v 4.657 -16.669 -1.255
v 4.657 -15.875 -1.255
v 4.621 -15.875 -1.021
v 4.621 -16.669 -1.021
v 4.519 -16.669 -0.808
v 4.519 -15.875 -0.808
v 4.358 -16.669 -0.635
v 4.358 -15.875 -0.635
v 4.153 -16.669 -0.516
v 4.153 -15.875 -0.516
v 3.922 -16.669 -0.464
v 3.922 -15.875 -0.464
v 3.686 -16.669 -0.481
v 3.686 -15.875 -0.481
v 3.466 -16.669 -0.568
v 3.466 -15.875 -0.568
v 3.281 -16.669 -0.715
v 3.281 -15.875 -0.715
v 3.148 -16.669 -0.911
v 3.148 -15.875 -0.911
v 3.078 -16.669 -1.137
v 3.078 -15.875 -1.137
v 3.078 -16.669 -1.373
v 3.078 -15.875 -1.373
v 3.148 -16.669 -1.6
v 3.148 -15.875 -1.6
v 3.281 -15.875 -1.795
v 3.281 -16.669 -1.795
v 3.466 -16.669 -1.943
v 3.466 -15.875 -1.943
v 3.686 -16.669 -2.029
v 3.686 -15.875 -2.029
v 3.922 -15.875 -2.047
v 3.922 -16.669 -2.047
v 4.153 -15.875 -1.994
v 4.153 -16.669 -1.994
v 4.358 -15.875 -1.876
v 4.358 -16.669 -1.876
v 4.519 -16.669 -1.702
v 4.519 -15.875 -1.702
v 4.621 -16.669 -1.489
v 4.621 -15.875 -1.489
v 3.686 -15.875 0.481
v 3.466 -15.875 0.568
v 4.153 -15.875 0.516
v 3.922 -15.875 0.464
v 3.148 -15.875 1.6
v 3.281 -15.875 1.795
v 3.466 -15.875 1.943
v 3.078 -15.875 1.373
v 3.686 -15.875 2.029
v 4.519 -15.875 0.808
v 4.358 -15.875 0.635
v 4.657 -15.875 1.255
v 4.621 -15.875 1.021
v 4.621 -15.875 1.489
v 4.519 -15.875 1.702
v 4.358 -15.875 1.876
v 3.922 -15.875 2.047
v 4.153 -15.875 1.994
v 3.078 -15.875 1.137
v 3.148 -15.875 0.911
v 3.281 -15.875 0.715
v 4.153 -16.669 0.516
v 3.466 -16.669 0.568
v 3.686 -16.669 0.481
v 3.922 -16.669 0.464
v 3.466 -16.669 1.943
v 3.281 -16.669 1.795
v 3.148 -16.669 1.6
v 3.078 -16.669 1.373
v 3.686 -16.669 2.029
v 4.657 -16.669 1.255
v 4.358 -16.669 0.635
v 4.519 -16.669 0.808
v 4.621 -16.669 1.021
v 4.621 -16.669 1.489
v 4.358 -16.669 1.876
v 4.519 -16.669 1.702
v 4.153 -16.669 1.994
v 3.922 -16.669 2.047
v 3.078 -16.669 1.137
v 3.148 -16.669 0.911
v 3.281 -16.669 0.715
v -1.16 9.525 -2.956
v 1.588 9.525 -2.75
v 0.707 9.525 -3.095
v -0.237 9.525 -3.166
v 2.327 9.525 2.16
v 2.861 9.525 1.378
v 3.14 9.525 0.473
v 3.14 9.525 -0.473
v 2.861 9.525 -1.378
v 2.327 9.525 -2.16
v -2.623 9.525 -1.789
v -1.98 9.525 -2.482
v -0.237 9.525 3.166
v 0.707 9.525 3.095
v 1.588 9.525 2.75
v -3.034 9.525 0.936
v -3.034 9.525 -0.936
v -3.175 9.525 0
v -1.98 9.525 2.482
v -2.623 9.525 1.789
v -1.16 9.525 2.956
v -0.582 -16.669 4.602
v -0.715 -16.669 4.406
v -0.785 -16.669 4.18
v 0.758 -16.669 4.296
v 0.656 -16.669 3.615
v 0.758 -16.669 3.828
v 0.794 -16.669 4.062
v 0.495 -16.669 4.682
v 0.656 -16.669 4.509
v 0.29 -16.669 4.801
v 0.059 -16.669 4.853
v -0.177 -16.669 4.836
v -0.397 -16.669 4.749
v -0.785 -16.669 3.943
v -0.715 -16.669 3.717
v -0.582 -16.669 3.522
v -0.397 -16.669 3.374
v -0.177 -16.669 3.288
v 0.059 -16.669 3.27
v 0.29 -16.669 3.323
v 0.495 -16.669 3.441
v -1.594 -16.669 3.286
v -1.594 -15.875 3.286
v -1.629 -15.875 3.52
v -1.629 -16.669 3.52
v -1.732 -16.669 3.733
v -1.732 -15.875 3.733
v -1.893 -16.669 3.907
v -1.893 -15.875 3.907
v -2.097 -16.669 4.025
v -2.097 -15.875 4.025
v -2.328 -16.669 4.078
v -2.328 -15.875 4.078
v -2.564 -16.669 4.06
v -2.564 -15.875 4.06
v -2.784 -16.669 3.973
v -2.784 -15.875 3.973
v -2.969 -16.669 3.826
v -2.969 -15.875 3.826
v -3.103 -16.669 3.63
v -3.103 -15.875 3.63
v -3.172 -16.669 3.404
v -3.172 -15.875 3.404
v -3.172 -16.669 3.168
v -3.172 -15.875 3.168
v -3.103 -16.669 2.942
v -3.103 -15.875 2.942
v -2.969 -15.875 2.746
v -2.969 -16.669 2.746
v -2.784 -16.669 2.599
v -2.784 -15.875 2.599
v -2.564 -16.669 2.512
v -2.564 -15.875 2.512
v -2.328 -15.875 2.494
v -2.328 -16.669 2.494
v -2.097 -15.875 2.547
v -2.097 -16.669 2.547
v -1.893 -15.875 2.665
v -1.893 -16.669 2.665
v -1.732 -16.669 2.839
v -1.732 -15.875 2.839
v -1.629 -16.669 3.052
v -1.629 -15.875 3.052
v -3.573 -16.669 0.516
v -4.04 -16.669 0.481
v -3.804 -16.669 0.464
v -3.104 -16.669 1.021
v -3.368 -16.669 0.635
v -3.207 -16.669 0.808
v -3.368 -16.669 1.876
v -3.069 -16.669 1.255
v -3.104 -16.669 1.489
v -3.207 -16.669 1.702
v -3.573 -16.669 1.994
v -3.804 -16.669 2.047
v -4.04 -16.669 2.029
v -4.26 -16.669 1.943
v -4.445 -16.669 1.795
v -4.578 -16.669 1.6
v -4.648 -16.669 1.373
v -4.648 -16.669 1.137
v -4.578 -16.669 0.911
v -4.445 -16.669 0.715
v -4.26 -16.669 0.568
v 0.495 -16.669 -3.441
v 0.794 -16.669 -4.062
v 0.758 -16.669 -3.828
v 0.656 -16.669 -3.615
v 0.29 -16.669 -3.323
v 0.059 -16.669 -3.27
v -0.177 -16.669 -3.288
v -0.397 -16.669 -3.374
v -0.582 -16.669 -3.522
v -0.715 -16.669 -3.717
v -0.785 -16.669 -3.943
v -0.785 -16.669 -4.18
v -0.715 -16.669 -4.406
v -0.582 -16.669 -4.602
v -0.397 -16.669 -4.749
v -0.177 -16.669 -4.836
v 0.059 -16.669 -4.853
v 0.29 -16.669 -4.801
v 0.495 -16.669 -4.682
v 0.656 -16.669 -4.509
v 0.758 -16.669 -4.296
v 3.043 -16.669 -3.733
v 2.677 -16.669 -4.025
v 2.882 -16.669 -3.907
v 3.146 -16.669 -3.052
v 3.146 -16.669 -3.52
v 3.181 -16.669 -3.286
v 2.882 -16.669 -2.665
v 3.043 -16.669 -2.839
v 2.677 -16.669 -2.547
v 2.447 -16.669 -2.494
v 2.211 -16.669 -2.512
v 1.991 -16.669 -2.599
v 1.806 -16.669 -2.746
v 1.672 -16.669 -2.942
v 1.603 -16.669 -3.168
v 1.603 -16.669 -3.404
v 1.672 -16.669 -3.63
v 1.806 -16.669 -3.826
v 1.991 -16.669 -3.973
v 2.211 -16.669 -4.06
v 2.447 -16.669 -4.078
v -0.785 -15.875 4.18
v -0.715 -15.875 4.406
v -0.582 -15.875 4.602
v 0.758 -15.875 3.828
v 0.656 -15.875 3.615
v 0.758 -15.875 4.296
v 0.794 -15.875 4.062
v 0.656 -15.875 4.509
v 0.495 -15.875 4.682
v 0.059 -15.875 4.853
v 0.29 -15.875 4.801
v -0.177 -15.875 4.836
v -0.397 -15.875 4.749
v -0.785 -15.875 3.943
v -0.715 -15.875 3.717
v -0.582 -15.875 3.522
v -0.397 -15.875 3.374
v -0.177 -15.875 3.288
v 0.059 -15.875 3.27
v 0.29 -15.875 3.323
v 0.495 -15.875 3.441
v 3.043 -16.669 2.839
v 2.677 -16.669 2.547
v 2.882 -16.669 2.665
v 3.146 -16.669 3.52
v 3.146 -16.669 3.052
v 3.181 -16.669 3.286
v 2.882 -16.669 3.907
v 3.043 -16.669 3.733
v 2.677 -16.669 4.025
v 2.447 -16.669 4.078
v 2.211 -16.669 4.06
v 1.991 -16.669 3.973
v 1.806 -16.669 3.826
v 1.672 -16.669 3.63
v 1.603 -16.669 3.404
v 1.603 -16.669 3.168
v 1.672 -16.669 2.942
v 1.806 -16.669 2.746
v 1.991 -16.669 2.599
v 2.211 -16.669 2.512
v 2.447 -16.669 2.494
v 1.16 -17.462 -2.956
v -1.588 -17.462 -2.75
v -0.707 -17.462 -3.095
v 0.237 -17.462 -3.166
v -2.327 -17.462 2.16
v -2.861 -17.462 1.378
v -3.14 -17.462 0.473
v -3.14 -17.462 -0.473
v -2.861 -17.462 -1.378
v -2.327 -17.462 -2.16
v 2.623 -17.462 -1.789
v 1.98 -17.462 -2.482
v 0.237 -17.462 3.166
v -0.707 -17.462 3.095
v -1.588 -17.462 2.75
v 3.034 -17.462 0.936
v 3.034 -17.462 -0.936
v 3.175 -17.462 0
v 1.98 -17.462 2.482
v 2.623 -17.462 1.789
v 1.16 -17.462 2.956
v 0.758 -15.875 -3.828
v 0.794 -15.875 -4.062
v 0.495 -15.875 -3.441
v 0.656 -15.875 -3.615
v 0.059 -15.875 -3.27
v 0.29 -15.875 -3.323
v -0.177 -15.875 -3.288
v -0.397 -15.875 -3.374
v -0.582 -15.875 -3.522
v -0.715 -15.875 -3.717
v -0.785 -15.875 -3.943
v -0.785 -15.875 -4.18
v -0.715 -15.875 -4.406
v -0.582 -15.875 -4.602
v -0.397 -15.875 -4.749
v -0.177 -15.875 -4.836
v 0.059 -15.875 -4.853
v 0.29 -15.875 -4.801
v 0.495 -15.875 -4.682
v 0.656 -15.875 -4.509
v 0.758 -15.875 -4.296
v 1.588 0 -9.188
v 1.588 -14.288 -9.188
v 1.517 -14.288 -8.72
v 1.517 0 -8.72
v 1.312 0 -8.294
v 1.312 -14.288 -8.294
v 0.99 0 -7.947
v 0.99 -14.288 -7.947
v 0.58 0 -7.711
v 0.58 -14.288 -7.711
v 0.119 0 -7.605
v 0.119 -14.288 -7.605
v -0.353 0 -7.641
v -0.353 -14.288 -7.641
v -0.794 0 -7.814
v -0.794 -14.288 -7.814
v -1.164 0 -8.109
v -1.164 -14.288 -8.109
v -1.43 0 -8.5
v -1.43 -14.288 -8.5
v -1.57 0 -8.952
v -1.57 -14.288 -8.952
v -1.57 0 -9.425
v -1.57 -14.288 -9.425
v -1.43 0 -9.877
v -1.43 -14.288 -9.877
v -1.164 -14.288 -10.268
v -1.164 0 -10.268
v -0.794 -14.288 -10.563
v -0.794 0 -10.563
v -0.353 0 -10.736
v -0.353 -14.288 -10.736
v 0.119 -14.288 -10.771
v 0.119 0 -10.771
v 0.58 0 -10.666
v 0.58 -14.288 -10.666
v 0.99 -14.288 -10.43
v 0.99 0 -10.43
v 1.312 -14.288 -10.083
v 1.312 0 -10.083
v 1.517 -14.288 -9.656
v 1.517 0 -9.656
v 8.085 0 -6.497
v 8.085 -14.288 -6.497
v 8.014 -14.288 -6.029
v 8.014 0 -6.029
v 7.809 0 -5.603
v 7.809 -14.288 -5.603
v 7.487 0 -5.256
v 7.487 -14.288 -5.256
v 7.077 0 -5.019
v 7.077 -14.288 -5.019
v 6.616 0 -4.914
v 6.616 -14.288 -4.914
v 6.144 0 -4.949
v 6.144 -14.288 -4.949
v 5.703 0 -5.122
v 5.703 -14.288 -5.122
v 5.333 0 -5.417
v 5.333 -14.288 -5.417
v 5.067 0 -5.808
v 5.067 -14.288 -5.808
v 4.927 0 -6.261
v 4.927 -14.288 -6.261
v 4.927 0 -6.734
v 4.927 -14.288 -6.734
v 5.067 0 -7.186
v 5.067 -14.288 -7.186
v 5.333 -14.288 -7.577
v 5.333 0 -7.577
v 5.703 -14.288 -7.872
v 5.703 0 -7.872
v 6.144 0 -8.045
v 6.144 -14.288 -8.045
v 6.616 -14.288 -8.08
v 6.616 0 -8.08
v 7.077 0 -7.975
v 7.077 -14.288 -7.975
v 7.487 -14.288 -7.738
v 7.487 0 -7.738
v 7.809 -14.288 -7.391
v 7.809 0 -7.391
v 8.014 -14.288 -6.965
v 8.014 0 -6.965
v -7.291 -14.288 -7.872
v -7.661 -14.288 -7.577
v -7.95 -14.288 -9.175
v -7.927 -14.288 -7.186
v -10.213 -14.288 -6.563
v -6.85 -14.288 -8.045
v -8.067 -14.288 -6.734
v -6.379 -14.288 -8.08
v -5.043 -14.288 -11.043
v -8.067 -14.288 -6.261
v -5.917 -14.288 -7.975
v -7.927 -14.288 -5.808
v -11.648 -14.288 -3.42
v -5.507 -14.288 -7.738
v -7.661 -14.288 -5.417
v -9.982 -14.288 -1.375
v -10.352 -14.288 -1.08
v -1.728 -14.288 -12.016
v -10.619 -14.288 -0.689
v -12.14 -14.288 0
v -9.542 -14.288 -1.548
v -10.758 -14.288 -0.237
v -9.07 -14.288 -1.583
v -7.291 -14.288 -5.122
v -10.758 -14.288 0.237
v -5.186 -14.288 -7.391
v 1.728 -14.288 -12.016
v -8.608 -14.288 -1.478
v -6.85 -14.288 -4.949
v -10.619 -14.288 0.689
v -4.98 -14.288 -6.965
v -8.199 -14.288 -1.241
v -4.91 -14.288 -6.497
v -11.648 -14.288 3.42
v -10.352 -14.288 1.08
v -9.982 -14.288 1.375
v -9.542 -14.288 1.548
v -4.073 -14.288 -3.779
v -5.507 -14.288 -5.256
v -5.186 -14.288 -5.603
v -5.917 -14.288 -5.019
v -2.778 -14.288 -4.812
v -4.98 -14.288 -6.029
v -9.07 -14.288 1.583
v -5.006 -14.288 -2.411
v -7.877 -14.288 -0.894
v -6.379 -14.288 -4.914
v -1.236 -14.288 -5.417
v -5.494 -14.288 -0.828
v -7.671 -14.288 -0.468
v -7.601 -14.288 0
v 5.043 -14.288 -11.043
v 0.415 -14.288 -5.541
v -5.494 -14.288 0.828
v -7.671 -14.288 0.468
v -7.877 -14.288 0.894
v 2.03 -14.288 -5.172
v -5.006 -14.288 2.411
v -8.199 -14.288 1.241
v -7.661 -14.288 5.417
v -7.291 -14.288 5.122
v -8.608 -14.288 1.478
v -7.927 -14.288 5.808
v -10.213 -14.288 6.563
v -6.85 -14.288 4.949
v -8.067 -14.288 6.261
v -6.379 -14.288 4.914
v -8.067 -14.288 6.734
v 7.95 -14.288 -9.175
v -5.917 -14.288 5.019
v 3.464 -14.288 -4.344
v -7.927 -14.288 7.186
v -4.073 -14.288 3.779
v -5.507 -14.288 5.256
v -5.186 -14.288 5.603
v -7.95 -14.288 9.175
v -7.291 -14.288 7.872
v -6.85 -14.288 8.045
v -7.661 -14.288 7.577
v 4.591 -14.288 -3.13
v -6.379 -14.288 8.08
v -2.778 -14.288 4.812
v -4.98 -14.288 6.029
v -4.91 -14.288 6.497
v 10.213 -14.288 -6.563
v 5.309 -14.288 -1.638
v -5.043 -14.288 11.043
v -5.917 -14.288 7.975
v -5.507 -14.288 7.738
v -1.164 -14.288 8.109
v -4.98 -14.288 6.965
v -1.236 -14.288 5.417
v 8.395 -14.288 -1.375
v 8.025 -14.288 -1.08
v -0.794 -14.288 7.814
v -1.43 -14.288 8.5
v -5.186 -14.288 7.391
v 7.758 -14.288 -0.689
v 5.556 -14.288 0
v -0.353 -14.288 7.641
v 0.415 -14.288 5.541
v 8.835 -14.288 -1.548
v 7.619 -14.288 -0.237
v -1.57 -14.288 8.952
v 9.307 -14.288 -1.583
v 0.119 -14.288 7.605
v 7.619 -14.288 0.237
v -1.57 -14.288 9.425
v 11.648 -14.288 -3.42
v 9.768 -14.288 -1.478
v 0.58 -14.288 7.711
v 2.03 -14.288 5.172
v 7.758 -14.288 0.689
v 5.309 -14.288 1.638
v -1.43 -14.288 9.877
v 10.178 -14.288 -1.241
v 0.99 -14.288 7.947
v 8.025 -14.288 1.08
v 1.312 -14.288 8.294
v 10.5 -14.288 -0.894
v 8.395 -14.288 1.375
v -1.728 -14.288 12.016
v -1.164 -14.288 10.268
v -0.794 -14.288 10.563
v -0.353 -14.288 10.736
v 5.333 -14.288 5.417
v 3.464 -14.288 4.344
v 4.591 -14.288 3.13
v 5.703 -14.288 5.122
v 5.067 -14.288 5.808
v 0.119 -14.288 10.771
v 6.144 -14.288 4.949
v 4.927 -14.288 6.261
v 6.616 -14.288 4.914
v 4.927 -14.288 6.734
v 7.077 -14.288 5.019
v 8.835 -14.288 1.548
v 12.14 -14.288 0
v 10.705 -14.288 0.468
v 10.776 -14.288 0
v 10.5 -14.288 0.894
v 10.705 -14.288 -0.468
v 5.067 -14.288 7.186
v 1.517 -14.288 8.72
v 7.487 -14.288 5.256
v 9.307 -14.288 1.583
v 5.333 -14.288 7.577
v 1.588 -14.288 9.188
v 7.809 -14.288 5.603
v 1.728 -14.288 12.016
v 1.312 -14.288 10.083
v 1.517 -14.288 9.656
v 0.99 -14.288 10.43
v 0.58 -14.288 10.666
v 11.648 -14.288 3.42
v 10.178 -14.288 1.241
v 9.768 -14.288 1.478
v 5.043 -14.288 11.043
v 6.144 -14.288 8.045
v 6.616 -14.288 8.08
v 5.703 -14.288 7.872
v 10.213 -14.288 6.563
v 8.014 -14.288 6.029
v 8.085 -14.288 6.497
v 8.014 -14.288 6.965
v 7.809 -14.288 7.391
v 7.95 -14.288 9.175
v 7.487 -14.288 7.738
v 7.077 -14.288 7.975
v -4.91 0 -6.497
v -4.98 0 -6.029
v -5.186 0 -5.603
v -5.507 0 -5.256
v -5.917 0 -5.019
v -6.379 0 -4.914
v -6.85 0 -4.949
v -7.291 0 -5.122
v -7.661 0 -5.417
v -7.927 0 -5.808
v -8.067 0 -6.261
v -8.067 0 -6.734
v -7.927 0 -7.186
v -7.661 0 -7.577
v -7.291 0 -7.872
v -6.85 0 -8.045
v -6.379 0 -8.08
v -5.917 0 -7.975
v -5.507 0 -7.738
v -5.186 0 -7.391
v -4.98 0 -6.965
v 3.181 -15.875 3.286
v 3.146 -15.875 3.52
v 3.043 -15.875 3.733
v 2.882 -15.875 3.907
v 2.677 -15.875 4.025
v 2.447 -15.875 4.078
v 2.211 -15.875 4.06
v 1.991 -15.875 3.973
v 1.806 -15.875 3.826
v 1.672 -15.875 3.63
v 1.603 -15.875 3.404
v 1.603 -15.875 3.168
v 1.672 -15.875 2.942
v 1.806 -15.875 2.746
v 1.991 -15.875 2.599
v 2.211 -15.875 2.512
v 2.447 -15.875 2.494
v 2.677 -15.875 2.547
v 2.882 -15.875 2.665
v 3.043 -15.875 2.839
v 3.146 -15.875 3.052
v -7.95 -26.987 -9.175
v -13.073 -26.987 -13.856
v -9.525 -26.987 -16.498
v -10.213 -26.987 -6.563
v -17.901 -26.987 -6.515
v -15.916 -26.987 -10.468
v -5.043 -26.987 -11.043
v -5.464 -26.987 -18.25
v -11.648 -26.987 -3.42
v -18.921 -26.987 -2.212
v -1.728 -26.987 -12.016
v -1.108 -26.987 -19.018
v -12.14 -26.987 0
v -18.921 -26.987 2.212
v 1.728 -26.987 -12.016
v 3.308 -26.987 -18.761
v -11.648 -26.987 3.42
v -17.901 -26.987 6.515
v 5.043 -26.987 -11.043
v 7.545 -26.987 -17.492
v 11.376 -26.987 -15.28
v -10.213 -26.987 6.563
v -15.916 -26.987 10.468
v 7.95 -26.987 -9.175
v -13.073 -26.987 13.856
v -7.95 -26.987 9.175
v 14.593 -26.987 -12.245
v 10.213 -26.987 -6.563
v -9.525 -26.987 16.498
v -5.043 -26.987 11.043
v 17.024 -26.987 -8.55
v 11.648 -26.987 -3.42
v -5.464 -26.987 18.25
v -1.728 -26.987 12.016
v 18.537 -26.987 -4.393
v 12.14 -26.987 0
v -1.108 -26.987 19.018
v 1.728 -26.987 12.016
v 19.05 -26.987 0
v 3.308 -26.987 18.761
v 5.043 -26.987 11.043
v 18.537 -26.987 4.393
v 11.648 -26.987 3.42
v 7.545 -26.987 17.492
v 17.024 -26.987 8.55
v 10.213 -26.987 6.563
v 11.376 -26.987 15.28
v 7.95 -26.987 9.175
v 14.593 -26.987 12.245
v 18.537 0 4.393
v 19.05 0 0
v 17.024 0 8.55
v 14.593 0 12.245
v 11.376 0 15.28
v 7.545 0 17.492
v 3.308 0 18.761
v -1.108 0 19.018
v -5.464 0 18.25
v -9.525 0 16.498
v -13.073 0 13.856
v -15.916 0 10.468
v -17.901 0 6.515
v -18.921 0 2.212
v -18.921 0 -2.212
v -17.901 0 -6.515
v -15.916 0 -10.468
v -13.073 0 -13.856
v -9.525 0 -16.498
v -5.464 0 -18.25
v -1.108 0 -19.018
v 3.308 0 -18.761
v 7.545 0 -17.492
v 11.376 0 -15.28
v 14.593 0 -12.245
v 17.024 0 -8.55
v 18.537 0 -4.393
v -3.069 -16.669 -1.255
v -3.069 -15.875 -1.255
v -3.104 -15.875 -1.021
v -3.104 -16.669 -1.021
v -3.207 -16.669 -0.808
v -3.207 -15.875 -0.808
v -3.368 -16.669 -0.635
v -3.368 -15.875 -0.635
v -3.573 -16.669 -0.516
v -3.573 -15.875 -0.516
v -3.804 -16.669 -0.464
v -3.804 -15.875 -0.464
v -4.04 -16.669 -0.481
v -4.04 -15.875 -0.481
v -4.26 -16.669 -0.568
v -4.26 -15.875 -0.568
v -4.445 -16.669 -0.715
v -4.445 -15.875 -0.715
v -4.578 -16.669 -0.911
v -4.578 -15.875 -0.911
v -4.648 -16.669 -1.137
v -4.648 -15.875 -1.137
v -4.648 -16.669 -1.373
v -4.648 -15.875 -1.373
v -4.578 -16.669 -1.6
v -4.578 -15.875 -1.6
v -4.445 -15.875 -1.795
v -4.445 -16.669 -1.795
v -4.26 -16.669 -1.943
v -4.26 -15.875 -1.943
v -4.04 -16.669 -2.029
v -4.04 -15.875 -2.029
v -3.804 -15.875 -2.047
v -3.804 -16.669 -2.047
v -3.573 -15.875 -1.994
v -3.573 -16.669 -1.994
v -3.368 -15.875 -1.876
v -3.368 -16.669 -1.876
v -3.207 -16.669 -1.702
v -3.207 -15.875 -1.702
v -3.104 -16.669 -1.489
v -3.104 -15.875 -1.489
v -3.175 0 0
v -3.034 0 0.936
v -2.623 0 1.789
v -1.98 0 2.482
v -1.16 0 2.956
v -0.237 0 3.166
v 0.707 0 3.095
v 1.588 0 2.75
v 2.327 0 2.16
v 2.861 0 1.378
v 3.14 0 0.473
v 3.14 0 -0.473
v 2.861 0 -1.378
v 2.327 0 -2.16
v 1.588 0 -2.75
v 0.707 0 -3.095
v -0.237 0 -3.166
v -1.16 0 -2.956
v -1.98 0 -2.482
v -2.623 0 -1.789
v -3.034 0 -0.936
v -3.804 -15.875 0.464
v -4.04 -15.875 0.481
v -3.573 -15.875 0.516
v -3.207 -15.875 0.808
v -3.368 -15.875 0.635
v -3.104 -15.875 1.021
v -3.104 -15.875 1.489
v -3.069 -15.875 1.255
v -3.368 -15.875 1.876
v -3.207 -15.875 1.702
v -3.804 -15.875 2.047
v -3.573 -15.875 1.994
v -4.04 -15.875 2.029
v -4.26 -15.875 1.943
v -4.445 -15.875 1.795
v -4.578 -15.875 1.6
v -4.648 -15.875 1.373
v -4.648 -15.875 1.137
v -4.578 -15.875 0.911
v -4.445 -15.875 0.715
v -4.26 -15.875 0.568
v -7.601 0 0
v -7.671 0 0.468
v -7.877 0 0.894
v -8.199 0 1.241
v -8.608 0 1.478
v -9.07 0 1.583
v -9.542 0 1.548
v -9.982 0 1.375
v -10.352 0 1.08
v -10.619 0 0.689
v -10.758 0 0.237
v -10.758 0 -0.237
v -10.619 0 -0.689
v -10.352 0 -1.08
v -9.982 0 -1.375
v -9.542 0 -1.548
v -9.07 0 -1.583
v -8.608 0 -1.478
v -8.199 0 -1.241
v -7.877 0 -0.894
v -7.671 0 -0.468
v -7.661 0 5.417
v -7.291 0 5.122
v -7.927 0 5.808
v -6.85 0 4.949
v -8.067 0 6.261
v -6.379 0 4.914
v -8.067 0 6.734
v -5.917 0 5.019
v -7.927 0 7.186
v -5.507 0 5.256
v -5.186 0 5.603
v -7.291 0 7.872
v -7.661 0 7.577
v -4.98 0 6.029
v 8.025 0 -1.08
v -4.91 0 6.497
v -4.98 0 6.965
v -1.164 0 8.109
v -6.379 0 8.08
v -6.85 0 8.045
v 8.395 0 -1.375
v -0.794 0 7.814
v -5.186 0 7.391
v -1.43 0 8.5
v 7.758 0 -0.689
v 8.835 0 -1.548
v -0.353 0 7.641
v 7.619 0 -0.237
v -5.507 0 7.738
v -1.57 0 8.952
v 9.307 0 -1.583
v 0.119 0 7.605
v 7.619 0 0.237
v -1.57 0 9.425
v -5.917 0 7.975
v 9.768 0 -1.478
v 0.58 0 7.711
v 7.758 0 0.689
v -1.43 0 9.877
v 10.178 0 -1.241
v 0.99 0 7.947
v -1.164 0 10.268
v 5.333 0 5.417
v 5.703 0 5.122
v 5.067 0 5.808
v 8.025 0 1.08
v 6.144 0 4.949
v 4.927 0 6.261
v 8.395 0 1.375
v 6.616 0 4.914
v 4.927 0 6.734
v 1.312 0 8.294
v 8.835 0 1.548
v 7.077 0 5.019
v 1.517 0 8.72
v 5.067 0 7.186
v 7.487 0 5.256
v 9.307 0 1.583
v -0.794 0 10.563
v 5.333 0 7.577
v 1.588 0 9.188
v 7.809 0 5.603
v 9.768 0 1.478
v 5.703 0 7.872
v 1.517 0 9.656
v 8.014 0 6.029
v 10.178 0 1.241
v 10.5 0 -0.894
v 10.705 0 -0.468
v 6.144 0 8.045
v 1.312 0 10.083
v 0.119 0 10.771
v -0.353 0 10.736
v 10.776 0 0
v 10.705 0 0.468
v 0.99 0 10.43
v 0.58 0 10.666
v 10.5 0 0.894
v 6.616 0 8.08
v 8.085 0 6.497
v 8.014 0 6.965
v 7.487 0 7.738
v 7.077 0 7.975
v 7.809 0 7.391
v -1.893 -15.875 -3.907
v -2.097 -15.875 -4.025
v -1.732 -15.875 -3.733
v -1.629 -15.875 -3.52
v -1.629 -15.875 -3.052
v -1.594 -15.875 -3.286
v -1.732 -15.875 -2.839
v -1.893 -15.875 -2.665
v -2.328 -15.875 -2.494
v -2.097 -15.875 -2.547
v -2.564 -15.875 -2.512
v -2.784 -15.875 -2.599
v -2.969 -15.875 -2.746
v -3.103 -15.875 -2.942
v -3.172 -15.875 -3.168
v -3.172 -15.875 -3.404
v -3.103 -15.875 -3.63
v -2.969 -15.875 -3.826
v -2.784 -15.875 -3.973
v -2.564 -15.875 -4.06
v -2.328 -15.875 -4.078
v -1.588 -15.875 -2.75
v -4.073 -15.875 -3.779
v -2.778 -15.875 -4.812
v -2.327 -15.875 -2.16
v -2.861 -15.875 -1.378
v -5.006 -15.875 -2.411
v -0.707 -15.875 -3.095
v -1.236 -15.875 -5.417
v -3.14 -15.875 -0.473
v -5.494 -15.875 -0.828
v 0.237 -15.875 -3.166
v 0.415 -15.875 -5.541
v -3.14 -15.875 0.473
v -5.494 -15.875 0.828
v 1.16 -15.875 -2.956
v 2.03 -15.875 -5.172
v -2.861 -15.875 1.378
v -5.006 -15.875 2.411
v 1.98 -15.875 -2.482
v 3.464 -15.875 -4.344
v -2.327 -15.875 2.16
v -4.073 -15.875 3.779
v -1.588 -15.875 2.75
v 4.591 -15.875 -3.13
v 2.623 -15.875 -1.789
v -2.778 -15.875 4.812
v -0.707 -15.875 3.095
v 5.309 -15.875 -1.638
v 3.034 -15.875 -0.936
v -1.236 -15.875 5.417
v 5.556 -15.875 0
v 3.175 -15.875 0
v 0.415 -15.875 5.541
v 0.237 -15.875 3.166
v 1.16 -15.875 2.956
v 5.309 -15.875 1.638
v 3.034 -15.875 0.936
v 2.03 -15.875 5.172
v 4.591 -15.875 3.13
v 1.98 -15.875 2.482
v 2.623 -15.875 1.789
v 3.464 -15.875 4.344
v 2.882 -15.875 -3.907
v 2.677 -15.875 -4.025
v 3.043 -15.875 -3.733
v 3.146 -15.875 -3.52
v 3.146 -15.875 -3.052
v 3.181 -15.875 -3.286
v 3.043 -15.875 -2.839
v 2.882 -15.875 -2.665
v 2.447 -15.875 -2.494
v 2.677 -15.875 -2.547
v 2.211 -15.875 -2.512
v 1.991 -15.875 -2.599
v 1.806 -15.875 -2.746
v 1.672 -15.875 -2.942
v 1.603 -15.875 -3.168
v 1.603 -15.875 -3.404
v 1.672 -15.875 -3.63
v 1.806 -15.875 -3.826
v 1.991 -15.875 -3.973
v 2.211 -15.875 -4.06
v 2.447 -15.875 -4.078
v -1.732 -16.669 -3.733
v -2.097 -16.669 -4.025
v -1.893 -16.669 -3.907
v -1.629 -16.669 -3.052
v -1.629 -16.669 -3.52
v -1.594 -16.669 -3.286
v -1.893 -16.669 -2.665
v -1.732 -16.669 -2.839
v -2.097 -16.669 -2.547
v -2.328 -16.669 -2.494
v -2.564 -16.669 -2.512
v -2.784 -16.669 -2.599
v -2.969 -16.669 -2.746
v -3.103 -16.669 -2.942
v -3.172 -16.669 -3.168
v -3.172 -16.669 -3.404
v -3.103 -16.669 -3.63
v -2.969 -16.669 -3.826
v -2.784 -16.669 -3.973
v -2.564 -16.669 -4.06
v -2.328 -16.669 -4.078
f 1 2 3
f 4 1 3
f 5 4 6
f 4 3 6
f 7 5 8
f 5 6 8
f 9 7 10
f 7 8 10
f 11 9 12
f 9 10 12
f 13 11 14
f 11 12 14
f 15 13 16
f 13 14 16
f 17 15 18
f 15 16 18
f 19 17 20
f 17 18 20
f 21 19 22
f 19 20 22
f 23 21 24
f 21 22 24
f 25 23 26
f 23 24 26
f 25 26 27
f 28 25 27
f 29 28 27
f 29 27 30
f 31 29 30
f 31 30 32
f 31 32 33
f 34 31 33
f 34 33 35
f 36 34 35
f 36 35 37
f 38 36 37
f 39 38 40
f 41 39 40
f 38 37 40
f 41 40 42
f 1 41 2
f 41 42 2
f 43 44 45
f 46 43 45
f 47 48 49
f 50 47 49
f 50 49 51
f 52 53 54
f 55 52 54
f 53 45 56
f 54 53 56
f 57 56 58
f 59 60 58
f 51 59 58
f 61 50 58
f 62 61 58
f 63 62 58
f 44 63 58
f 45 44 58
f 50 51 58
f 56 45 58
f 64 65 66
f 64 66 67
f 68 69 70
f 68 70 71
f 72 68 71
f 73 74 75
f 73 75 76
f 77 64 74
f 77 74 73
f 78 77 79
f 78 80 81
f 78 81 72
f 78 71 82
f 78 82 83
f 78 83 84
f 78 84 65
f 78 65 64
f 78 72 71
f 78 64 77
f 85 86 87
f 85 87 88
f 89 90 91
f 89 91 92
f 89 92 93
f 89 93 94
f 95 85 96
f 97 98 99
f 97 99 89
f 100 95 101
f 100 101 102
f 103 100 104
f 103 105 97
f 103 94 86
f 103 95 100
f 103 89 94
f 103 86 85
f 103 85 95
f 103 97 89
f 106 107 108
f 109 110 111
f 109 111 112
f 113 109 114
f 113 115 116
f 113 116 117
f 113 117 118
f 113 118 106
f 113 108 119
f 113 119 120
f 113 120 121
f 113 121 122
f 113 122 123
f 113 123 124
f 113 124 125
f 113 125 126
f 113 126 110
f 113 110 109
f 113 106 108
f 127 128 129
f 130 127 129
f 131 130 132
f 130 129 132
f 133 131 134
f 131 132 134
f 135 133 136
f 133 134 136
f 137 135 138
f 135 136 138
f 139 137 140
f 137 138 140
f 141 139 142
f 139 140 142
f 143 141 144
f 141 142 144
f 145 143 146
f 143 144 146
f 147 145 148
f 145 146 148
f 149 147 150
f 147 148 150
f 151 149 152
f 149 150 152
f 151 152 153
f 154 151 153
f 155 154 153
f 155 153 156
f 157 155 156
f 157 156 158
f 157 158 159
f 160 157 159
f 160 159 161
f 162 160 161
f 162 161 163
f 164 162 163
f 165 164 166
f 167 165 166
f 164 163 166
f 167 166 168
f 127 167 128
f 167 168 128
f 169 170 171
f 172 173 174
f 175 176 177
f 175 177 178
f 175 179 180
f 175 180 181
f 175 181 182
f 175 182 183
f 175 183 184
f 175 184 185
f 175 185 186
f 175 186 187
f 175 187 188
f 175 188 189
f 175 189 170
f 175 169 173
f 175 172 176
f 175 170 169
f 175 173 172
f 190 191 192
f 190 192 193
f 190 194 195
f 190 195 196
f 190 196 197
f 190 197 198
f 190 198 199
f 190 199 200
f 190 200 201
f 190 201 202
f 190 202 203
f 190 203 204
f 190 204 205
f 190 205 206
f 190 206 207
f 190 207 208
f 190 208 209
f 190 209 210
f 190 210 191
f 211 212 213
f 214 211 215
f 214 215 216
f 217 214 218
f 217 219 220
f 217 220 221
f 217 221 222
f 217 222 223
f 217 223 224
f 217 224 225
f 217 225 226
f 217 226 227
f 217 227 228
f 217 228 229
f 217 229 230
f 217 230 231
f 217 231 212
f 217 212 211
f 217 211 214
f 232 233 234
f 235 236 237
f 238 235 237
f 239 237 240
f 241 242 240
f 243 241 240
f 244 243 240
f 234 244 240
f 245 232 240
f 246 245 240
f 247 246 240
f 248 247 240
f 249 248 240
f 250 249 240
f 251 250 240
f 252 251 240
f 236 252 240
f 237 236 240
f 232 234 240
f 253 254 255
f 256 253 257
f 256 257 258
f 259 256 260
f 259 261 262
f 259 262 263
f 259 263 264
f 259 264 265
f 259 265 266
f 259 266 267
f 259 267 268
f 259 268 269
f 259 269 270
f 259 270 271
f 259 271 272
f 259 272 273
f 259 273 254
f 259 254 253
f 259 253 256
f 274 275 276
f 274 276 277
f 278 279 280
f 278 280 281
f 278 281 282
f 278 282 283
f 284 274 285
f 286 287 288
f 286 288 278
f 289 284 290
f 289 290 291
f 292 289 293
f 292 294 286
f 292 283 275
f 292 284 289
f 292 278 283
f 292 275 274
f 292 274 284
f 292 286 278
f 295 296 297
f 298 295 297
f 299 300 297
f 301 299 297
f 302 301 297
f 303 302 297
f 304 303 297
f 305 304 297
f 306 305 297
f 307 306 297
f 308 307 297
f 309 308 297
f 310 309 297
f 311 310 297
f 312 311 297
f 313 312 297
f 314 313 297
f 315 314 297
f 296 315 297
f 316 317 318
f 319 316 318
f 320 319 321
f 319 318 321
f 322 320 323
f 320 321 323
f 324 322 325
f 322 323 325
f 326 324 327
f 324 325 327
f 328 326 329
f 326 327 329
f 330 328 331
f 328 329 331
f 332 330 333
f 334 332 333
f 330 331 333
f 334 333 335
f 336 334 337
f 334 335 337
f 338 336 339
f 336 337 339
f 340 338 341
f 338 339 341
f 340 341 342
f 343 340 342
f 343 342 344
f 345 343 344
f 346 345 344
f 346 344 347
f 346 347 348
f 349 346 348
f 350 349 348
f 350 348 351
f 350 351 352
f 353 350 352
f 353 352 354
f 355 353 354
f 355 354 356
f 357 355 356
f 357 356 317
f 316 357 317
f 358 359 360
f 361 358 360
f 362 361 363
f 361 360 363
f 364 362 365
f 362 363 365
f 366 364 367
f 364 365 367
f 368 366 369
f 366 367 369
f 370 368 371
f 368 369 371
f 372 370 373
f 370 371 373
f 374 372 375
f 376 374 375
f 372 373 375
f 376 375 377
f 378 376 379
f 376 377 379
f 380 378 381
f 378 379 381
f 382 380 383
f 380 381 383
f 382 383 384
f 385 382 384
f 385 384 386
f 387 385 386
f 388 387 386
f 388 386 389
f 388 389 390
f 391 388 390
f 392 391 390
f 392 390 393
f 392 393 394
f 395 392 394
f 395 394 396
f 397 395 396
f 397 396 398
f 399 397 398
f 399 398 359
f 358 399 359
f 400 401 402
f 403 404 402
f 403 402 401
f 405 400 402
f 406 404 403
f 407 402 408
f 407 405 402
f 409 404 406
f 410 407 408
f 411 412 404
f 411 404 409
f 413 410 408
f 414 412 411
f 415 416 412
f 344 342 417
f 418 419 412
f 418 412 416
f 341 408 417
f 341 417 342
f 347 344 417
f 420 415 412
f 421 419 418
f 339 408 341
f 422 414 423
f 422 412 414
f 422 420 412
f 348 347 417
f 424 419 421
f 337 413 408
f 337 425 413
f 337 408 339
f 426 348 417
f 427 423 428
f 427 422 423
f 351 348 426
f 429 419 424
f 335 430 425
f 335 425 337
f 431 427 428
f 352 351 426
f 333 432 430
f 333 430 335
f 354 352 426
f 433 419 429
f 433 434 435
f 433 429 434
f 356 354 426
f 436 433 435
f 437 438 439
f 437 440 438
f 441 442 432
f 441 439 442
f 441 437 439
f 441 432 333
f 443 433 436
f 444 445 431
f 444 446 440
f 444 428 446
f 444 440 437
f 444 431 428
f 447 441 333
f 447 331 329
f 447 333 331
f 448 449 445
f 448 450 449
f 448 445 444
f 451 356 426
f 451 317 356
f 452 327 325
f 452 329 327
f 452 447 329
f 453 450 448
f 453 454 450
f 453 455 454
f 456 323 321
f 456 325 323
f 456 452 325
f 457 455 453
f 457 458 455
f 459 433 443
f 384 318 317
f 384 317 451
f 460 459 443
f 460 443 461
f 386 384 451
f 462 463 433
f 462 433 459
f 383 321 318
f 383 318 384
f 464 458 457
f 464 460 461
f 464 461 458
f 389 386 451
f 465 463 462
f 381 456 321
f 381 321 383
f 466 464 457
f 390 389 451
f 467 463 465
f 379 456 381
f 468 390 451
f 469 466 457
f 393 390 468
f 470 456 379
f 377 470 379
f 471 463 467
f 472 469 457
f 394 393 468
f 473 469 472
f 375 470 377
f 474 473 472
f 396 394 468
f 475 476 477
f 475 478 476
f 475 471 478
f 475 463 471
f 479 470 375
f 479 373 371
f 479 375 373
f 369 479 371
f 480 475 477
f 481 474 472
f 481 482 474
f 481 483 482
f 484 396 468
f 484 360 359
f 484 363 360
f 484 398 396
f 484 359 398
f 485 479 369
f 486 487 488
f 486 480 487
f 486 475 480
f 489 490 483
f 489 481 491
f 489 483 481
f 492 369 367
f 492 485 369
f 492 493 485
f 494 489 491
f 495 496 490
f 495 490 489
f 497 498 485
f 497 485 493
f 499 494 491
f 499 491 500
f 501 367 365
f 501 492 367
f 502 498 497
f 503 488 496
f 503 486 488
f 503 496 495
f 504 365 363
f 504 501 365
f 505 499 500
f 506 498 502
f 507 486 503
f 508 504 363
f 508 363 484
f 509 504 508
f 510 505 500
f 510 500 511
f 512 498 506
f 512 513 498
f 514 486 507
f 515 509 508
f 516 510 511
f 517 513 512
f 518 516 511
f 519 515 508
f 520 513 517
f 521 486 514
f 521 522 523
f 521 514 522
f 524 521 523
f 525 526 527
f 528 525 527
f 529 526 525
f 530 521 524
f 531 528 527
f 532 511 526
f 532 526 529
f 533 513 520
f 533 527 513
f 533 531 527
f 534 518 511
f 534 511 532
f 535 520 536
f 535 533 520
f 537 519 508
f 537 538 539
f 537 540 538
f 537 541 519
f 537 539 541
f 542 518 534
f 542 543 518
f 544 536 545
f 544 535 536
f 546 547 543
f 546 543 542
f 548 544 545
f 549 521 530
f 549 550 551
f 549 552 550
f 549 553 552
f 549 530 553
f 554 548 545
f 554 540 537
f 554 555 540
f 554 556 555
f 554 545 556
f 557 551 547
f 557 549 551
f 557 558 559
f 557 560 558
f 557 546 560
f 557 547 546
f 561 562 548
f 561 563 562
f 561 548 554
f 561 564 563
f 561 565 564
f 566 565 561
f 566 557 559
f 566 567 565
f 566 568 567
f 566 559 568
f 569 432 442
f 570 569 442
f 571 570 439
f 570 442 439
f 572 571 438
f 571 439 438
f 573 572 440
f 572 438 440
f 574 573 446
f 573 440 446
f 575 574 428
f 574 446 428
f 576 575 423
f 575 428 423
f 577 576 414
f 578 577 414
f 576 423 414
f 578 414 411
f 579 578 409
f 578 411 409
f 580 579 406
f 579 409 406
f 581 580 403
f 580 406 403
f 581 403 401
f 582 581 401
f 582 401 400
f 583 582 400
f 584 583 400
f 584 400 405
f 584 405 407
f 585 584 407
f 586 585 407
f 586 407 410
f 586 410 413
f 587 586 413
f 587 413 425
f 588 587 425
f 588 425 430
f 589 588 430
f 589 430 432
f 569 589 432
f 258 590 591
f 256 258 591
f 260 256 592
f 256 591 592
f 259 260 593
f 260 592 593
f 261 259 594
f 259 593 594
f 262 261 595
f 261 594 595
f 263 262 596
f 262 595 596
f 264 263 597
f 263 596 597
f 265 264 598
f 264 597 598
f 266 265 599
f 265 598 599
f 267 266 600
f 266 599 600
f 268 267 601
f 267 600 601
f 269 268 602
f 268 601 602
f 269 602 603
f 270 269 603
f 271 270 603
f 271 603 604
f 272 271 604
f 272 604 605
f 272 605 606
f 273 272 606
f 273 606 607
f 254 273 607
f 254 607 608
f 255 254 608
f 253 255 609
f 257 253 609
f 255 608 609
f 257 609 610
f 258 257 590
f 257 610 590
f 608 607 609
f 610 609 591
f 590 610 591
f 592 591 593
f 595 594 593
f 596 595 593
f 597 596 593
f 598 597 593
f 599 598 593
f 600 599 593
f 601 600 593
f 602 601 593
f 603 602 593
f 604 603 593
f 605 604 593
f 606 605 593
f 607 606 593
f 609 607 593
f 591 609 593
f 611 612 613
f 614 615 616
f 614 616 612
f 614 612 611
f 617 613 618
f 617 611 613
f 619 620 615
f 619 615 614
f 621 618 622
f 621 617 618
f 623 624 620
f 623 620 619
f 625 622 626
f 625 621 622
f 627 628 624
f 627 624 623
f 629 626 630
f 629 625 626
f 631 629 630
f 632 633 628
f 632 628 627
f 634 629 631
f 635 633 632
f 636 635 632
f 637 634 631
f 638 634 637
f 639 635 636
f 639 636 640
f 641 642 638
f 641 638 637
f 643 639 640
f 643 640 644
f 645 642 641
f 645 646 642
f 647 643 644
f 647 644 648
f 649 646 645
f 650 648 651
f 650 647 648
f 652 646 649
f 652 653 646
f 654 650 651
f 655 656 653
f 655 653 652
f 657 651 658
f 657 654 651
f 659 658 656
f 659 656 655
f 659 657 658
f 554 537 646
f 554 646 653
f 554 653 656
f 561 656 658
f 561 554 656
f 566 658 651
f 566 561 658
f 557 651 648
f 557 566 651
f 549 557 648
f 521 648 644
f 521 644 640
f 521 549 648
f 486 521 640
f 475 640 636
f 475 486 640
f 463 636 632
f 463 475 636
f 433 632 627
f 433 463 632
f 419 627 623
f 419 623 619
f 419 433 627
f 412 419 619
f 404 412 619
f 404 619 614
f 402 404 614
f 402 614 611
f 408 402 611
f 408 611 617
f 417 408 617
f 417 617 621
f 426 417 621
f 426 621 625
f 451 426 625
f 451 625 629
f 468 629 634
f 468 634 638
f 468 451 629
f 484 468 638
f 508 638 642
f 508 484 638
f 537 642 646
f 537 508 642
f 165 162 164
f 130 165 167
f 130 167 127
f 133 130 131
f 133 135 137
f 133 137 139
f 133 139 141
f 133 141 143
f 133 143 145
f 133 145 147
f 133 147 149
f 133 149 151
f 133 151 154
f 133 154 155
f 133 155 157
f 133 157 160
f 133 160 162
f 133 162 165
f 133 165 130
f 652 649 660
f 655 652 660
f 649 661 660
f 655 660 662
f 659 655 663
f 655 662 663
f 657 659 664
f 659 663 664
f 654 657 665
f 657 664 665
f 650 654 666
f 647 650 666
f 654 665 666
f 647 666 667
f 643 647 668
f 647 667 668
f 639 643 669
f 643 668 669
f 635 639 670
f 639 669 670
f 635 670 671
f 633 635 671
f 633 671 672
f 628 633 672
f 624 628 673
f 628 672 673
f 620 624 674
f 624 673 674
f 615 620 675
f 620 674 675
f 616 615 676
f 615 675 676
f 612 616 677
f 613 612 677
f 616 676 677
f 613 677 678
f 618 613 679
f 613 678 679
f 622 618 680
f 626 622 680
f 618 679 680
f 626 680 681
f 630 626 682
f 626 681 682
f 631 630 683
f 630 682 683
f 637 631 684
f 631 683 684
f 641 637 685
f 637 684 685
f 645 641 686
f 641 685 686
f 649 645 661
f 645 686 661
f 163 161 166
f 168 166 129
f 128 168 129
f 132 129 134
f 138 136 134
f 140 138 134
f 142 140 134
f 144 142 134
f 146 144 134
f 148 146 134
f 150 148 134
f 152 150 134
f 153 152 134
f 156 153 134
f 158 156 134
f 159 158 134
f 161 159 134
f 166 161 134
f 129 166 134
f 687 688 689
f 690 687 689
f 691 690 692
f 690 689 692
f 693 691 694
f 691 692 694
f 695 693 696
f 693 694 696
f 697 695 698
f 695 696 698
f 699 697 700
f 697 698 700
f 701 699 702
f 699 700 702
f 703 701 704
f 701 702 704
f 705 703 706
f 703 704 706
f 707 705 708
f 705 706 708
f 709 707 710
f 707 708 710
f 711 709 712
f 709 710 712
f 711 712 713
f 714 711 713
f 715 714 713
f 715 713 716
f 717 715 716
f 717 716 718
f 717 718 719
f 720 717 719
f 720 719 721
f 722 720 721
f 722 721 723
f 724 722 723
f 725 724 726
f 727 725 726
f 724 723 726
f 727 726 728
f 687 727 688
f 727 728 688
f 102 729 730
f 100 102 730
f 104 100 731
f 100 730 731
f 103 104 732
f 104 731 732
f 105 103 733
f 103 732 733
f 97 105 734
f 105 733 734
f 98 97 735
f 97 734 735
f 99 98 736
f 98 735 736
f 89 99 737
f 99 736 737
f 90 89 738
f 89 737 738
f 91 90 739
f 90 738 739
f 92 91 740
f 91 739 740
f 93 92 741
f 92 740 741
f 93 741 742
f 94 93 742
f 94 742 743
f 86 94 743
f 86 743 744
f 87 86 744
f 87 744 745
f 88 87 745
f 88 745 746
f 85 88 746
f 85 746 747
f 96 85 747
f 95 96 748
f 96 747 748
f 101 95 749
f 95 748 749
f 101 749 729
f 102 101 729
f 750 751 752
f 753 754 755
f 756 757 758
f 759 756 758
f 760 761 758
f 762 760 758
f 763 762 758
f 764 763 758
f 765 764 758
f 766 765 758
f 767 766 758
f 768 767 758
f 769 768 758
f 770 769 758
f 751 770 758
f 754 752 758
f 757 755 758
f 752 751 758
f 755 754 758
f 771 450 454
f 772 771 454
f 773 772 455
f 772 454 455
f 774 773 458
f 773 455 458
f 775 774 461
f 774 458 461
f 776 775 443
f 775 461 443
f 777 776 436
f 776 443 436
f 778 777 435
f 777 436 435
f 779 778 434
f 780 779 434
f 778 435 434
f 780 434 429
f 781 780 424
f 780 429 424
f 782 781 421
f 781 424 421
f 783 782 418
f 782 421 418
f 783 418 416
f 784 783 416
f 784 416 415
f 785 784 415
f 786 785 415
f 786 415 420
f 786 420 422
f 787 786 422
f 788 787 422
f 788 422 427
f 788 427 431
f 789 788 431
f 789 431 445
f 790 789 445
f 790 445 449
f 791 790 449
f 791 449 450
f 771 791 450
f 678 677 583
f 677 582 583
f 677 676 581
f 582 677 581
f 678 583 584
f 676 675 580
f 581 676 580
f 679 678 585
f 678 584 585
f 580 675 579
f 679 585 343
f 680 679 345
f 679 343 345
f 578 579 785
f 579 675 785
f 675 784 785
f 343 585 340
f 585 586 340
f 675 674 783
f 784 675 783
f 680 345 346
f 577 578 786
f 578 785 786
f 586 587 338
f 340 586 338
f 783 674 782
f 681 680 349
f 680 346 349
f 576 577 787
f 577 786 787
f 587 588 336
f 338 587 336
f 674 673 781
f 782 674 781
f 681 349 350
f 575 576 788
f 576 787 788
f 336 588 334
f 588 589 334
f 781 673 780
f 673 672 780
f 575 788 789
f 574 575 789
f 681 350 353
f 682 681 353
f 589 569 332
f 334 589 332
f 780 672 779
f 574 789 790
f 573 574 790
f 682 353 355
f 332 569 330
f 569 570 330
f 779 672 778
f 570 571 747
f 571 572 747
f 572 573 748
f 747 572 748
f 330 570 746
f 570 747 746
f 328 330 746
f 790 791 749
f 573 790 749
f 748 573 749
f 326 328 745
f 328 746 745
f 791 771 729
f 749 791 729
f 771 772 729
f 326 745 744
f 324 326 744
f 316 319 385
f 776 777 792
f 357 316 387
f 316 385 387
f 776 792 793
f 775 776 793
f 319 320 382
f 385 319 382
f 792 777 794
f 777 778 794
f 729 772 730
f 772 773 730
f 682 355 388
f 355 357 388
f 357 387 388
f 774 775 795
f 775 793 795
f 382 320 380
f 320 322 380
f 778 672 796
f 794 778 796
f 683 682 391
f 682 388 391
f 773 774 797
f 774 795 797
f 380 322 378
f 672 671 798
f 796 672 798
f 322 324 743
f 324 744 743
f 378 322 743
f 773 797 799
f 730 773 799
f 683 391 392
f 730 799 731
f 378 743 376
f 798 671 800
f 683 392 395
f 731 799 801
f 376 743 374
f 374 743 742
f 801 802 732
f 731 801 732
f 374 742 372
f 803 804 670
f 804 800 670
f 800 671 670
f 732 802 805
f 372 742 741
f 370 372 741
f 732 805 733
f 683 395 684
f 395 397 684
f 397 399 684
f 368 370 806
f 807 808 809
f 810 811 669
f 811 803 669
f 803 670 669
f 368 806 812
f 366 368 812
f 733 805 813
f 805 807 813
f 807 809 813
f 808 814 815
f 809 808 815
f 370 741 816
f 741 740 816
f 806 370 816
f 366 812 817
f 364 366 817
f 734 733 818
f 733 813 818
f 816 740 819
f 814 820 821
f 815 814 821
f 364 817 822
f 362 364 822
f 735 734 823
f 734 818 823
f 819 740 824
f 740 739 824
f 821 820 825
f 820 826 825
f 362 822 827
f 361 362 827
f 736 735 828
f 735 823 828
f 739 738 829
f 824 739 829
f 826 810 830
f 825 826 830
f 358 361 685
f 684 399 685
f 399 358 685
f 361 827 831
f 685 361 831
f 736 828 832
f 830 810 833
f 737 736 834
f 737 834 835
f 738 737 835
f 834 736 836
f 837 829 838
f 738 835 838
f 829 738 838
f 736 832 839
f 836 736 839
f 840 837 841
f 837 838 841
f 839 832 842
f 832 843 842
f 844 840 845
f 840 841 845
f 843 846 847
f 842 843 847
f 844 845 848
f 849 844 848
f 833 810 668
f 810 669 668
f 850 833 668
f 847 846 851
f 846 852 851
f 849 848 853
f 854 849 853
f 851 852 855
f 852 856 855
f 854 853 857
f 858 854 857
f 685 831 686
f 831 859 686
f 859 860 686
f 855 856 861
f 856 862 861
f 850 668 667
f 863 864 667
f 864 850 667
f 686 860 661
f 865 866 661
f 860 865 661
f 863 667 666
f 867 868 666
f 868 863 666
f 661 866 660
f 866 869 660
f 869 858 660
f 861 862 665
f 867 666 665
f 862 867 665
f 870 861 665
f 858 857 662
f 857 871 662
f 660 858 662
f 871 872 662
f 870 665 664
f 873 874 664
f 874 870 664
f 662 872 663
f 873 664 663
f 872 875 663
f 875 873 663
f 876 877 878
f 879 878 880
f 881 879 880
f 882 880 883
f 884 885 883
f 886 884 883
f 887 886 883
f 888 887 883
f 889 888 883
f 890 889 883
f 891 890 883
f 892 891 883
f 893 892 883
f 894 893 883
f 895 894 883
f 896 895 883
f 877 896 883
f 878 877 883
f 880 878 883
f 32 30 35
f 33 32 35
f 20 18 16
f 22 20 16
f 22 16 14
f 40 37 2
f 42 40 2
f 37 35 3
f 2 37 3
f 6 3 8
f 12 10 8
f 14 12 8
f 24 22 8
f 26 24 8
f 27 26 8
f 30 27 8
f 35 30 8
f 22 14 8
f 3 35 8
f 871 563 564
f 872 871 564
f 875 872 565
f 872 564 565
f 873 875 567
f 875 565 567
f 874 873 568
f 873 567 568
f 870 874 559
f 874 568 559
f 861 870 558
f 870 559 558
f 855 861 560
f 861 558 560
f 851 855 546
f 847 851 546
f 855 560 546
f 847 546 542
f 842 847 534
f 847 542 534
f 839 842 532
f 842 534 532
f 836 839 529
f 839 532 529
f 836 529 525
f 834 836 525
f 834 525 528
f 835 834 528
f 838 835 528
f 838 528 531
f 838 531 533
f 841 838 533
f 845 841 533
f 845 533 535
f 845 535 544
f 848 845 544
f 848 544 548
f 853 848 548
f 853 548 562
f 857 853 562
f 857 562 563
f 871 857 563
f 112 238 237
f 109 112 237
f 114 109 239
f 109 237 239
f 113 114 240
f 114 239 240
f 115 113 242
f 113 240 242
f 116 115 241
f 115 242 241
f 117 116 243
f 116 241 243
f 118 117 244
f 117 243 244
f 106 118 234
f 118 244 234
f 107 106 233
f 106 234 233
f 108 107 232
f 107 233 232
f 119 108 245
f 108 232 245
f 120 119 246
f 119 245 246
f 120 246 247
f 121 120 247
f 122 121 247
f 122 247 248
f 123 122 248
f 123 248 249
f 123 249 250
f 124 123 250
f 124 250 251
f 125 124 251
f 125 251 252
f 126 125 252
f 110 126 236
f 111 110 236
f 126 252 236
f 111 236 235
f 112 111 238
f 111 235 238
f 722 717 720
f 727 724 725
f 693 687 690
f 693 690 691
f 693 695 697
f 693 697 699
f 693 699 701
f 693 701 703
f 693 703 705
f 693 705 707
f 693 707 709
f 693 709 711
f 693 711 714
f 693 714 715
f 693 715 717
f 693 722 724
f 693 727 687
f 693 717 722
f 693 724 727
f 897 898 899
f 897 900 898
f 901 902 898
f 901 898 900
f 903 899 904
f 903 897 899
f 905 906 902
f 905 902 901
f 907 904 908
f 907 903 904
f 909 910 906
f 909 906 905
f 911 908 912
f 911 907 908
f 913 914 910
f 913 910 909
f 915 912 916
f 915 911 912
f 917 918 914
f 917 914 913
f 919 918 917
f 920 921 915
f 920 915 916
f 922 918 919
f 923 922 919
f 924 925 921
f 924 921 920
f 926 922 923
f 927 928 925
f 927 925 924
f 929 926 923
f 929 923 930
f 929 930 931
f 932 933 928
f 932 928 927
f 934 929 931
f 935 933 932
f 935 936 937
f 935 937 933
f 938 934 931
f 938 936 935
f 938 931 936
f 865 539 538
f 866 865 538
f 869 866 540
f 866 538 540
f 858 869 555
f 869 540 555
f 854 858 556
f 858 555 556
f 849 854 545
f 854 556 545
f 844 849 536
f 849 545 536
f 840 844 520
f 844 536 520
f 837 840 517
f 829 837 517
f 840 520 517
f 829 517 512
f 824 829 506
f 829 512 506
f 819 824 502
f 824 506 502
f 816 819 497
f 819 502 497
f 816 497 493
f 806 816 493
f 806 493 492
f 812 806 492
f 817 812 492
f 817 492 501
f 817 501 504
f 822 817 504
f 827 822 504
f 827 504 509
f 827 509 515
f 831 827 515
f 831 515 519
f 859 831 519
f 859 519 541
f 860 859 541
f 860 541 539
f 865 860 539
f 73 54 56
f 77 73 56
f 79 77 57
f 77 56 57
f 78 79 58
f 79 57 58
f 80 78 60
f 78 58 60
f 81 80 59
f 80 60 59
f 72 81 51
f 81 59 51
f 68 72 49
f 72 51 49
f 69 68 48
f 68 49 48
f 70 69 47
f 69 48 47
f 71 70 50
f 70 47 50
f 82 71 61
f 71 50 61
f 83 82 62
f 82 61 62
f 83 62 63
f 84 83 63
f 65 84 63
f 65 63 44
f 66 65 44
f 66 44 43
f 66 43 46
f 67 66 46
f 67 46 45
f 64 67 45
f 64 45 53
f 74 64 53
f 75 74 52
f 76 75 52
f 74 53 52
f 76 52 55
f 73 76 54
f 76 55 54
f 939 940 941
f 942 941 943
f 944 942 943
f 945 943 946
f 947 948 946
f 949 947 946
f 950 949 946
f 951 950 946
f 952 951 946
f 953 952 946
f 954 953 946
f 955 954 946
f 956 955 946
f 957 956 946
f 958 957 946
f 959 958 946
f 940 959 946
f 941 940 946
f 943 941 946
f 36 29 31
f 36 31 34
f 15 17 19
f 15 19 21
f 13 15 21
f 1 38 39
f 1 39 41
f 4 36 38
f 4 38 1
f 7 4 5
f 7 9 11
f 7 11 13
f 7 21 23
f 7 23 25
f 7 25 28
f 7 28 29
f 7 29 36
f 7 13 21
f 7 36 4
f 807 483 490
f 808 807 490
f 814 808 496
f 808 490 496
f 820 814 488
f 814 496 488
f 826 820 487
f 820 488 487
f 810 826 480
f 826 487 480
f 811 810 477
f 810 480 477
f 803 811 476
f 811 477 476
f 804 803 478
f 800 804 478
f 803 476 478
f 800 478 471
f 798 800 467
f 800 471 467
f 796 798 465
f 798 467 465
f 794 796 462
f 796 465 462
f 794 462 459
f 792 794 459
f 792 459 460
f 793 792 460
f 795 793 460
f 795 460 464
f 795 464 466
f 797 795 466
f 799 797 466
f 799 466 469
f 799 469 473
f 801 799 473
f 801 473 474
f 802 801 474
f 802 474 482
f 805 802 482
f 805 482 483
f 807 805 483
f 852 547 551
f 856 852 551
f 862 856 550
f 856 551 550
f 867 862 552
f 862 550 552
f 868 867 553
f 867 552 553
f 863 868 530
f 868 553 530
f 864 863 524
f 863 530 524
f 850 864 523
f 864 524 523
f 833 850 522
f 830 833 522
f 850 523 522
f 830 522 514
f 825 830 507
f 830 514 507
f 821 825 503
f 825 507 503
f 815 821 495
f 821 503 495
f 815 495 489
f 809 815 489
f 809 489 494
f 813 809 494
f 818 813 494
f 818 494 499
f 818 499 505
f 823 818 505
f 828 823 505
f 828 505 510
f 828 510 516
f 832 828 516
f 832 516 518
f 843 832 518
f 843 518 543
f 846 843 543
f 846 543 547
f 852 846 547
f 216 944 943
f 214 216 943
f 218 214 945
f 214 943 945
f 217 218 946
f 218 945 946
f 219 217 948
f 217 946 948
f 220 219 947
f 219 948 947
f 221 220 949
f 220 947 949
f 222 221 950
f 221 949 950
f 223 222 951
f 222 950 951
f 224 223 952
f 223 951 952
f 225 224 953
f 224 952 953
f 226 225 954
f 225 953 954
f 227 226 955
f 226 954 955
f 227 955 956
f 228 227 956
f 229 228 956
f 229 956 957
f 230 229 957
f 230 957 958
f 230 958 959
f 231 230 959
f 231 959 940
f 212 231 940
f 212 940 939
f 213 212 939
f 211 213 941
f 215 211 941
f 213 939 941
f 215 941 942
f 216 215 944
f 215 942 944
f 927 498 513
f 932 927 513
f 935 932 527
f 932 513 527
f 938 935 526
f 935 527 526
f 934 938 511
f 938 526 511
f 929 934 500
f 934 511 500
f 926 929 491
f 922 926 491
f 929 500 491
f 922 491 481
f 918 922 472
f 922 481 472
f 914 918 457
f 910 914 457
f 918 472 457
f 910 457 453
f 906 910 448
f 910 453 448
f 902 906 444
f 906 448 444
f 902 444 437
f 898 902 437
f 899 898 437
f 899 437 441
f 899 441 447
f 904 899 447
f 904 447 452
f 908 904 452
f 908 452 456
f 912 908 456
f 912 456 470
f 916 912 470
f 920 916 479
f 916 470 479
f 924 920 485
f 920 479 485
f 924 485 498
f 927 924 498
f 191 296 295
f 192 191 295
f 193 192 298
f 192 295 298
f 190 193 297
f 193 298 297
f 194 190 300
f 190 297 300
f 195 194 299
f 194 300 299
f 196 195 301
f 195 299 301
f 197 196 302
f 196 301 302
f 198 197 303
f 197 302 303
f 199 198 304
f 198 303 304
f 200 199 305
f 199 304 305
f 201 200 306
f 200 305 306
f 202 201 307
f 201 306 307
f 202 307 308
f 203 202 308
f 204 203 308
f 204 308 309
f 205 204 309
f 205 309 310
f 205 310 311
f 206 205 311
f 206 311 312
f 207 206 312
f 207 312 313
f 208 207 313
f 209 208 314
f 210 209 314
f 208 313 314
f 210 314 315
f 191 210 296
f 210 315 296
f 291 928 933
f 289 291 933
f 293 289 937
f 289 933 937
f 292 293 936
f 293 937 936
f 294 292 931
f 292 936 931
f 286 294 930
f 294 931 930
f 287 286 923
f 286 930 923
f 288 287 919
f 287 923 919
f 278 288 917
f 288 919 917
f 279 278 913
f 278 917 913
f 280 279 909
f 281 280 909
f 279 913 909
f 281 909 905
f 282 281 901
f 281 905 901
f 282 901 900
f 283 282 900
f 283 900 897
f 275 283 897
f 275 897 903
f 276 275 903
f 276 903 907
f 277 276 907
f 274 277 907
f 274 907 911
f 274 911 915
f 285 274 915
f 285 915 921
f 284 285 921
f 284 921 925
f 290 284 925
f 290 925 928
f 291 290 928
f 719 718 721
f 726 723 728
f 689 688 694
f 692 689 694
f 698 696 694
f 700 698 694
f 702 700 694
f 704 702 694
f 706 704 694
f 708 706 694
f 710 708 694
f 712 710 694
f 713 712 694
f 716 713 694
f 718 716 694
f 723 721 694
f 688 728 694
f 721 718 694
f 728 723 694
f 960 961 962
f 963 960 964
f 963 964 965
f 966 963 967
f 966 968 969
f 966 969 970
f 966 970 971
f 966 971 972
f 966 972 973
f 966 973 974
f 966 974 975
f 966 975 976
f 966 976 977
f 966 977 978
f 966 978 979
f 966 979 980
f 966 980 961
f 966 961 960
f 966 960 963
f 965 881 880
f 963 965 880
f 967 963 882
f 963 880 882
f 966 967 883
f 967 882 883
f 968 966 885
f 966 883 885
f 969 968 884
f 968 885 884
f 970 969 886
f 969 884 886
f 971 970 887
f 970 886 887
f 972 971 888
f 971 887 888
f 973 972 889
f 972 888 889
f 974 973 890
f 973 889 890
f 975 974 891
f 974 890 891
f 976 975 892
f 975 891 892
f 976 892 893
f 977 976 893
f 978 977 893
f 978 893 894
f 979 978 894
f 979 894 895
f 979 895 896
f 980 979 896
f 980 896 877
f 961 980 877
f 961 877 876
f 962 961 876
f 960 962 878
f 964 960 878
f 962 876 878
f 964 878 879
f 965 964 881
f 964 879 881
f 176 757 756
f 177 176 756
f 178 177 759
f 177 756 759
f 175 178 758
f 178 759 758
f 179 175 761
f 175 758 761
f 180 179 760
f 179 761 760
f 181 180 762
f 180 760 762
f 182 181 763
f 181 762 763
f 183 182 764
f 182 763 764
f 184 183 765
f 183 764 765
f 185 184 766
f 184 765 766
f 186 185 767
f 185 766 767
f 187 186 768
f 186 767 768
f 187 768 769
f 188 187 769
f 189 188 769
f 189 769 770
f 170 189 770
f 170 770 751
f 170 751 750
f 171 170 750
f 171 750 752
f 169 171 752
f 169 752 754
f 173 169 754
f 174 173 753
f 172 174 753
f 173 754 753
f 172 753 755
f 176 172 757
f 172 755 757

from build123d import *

# Parameters (mm, degrees)
F0_R      = 19.05
F1_DEPTH  = 14.2875
F2_R      = 1.5875
F3_DEPTH  = 20.32
F5_R      = 3.175
F6_DEPTH  = 3.175
F4_R      = 5.55625
F7_DEPTH  = 1.5875
F8_R      = 0.79375
F9_DEPTH  = 0.79375
F10_R     = 3.175
F11_DEPTH = 9.525
F12_R     = 19.05
F12_R_2   = 12.139806815
F13_DEPTH = 12.7


with BuildPart() as f1:
    # F0 (on Front) → F1 (new body)
    with BuildSketch(Plane.XZ):
        Circle(F0_R)
    extrude(amount=F1_DEPTH)

    # F2 (on face) → F3 (cut)
    with BuildSketch(Plane.XZ.offset(14.2875)):
        with Locations((0, 9.1884150909)):
            Circle(F2_R)
        with Locations((6.4971906191, 6.4971906191)):
            Circle(F2_R)
        with Locations((9.1884150909, 0)):
            Circle(F2_R)
        with Locations((6.4971906191, -6.4971906191)):
            Circle(F2_R)
        with Locations((0, -9.1884150909)):
            Circle(F2_R)
        with Locations((-6.4971906191, -6.4971906191)):
            Circle(F2_R)
        with Locations((-9.1884150909, 0)):
            Circle(F2_R)
        with Locations((-6.4971906191, 6.4971906191)):
            Circle(F2_R)
    extrude(amount=-F3_DEPTH, mode=Mode.SUBTRACT)

    # F5 (on face) → F6 (join)
    with BuildSketch(Plane.XZ.offset(14.2875)):
        Circle(F5_R)
    extrude(amount=F6_DEPTH)

    # F4 (on face) → F7 (join)
    with BuildSketch(Plane.XZ.offset(14.2875)):
        Circle(F4_R)
    extrude(amount=F7_DEPTH)

    # F10 (on face) → F11 (join)
    with BuildSketch(Plane(origin=(0, 0, 0), x_dir=(-1, 0, 0), z_dir=(0, 1, 0))):
        Circle(F10_R)
    extrude(amount=F11_DEPTH)

    # F12 (on face) → F13 (join)
    with BuildSketch(Plane.XZ.offset(14.2875)):
        Circle(F12_R)
        Circle(F12_R_2, mode=Mode.SUBTRACT)
    extrude(amount=F13_DEPTH)


with BuildPart() as f9:
    # F8 (on face) → F9 (new body)
    with BuildSketch(Plane.XZ.offset(15.875)):
        with Locations((0, 4.0617209223)):
            Circle(F8_R)
    extrude(amount=F9_DEPTH)


with BuildPart() as f9b:
    # F8 (on face) → F9, piece 2 (new body)
    with BuildSketch(Plane.XZ.offset(15.875)):
        with Locations((2.387419657, 3.2860012525)):
            Circle(F8_R)
    extrude(amount=F9_DEPTH)


with BuildPart() as f9c:
    # F8 (on face) → F9, piece 3 (new body)
    with BuildSketch(Plane.XZ.offset(15.875)):
        with Locations((3.8629261505, 1.2551407914)):
            Circle(F8_R)
    extrude(amount=F9_DEPTH)


with BuildPart() as f9d:
    # F8 (on face) → F9, piece 4 (new body)
    with BuildSketch(Plane.XZ.offset(15.875)):
        with Locations((3.8629261505, -1.2551407914)):
            Circle(F8_R)
    extrude(amount=F9_DEPTH)


with BuildPart() as f9e:
    # F8 (on face) → F9, piece 5 (new body)
    with BuildSketch(Plane.XZ.offset(15.875)):
        with Locations((2.387419657, -3.2860012525)):
            Circle(F8_R)
    extrude(amount=F9_DEPTH)


with BuildPart() as f9f:
    # F8 (on face) → F9, piece 6 (new body)
    with BuildSketch(Plane.XZ.offset(15.875)):
        with Locations((0, -4.0617209223)):
            Circle(F8_R)
    extrude(amount=F9_DEPTH)


with BuildPart() as f9g:
    # F8 (on face) → F9, piece 7 (new body)
    with BuildSketch(Plane.XZ.offset(15.875)):
        with Locations((-2.387419657, -3.2860012525)):
            Circle(F8_R)
    extrude(amount=F9_DEPTH)


with BuildPart() as f9h:
    # F8 (on face) → F9, piece 8 (new body)
    with BuildSketch(Plane.XZ.offset(15.875)):
        with Locations((-3.8629261505, -1.2551407914)):
            Circle(F8_R)
    extrude(amount=F9_DEPTH)


with BuildPart() as f9i:
    # F8 (on face) → F9, piece 9 (new body)
    with BuildSketch(Plane.XZ.offset(15.875)):
        with Locations((-3.8629261505, 1.2551407914)):
            Circle(F8_R)
    extrude(amount=F9_DEPTH)


with BuildPart() as f9j:
    # F8 (on face) → F9, piece 10 (new body)
    with BuildSketch(Plane.XZ.offset(15.875)):
        with Locations((-2.387419657, 3.2860012525)):
            Circle(F8_R)
    extrude(amount=F9_DEPTH)


solid = Compound([f1.part, f9.part, f9b.part, f9c.part, f9d.part, f9e.part, f9f.part, f9g.part, f9h.part, f9i.part, f9j.part])
